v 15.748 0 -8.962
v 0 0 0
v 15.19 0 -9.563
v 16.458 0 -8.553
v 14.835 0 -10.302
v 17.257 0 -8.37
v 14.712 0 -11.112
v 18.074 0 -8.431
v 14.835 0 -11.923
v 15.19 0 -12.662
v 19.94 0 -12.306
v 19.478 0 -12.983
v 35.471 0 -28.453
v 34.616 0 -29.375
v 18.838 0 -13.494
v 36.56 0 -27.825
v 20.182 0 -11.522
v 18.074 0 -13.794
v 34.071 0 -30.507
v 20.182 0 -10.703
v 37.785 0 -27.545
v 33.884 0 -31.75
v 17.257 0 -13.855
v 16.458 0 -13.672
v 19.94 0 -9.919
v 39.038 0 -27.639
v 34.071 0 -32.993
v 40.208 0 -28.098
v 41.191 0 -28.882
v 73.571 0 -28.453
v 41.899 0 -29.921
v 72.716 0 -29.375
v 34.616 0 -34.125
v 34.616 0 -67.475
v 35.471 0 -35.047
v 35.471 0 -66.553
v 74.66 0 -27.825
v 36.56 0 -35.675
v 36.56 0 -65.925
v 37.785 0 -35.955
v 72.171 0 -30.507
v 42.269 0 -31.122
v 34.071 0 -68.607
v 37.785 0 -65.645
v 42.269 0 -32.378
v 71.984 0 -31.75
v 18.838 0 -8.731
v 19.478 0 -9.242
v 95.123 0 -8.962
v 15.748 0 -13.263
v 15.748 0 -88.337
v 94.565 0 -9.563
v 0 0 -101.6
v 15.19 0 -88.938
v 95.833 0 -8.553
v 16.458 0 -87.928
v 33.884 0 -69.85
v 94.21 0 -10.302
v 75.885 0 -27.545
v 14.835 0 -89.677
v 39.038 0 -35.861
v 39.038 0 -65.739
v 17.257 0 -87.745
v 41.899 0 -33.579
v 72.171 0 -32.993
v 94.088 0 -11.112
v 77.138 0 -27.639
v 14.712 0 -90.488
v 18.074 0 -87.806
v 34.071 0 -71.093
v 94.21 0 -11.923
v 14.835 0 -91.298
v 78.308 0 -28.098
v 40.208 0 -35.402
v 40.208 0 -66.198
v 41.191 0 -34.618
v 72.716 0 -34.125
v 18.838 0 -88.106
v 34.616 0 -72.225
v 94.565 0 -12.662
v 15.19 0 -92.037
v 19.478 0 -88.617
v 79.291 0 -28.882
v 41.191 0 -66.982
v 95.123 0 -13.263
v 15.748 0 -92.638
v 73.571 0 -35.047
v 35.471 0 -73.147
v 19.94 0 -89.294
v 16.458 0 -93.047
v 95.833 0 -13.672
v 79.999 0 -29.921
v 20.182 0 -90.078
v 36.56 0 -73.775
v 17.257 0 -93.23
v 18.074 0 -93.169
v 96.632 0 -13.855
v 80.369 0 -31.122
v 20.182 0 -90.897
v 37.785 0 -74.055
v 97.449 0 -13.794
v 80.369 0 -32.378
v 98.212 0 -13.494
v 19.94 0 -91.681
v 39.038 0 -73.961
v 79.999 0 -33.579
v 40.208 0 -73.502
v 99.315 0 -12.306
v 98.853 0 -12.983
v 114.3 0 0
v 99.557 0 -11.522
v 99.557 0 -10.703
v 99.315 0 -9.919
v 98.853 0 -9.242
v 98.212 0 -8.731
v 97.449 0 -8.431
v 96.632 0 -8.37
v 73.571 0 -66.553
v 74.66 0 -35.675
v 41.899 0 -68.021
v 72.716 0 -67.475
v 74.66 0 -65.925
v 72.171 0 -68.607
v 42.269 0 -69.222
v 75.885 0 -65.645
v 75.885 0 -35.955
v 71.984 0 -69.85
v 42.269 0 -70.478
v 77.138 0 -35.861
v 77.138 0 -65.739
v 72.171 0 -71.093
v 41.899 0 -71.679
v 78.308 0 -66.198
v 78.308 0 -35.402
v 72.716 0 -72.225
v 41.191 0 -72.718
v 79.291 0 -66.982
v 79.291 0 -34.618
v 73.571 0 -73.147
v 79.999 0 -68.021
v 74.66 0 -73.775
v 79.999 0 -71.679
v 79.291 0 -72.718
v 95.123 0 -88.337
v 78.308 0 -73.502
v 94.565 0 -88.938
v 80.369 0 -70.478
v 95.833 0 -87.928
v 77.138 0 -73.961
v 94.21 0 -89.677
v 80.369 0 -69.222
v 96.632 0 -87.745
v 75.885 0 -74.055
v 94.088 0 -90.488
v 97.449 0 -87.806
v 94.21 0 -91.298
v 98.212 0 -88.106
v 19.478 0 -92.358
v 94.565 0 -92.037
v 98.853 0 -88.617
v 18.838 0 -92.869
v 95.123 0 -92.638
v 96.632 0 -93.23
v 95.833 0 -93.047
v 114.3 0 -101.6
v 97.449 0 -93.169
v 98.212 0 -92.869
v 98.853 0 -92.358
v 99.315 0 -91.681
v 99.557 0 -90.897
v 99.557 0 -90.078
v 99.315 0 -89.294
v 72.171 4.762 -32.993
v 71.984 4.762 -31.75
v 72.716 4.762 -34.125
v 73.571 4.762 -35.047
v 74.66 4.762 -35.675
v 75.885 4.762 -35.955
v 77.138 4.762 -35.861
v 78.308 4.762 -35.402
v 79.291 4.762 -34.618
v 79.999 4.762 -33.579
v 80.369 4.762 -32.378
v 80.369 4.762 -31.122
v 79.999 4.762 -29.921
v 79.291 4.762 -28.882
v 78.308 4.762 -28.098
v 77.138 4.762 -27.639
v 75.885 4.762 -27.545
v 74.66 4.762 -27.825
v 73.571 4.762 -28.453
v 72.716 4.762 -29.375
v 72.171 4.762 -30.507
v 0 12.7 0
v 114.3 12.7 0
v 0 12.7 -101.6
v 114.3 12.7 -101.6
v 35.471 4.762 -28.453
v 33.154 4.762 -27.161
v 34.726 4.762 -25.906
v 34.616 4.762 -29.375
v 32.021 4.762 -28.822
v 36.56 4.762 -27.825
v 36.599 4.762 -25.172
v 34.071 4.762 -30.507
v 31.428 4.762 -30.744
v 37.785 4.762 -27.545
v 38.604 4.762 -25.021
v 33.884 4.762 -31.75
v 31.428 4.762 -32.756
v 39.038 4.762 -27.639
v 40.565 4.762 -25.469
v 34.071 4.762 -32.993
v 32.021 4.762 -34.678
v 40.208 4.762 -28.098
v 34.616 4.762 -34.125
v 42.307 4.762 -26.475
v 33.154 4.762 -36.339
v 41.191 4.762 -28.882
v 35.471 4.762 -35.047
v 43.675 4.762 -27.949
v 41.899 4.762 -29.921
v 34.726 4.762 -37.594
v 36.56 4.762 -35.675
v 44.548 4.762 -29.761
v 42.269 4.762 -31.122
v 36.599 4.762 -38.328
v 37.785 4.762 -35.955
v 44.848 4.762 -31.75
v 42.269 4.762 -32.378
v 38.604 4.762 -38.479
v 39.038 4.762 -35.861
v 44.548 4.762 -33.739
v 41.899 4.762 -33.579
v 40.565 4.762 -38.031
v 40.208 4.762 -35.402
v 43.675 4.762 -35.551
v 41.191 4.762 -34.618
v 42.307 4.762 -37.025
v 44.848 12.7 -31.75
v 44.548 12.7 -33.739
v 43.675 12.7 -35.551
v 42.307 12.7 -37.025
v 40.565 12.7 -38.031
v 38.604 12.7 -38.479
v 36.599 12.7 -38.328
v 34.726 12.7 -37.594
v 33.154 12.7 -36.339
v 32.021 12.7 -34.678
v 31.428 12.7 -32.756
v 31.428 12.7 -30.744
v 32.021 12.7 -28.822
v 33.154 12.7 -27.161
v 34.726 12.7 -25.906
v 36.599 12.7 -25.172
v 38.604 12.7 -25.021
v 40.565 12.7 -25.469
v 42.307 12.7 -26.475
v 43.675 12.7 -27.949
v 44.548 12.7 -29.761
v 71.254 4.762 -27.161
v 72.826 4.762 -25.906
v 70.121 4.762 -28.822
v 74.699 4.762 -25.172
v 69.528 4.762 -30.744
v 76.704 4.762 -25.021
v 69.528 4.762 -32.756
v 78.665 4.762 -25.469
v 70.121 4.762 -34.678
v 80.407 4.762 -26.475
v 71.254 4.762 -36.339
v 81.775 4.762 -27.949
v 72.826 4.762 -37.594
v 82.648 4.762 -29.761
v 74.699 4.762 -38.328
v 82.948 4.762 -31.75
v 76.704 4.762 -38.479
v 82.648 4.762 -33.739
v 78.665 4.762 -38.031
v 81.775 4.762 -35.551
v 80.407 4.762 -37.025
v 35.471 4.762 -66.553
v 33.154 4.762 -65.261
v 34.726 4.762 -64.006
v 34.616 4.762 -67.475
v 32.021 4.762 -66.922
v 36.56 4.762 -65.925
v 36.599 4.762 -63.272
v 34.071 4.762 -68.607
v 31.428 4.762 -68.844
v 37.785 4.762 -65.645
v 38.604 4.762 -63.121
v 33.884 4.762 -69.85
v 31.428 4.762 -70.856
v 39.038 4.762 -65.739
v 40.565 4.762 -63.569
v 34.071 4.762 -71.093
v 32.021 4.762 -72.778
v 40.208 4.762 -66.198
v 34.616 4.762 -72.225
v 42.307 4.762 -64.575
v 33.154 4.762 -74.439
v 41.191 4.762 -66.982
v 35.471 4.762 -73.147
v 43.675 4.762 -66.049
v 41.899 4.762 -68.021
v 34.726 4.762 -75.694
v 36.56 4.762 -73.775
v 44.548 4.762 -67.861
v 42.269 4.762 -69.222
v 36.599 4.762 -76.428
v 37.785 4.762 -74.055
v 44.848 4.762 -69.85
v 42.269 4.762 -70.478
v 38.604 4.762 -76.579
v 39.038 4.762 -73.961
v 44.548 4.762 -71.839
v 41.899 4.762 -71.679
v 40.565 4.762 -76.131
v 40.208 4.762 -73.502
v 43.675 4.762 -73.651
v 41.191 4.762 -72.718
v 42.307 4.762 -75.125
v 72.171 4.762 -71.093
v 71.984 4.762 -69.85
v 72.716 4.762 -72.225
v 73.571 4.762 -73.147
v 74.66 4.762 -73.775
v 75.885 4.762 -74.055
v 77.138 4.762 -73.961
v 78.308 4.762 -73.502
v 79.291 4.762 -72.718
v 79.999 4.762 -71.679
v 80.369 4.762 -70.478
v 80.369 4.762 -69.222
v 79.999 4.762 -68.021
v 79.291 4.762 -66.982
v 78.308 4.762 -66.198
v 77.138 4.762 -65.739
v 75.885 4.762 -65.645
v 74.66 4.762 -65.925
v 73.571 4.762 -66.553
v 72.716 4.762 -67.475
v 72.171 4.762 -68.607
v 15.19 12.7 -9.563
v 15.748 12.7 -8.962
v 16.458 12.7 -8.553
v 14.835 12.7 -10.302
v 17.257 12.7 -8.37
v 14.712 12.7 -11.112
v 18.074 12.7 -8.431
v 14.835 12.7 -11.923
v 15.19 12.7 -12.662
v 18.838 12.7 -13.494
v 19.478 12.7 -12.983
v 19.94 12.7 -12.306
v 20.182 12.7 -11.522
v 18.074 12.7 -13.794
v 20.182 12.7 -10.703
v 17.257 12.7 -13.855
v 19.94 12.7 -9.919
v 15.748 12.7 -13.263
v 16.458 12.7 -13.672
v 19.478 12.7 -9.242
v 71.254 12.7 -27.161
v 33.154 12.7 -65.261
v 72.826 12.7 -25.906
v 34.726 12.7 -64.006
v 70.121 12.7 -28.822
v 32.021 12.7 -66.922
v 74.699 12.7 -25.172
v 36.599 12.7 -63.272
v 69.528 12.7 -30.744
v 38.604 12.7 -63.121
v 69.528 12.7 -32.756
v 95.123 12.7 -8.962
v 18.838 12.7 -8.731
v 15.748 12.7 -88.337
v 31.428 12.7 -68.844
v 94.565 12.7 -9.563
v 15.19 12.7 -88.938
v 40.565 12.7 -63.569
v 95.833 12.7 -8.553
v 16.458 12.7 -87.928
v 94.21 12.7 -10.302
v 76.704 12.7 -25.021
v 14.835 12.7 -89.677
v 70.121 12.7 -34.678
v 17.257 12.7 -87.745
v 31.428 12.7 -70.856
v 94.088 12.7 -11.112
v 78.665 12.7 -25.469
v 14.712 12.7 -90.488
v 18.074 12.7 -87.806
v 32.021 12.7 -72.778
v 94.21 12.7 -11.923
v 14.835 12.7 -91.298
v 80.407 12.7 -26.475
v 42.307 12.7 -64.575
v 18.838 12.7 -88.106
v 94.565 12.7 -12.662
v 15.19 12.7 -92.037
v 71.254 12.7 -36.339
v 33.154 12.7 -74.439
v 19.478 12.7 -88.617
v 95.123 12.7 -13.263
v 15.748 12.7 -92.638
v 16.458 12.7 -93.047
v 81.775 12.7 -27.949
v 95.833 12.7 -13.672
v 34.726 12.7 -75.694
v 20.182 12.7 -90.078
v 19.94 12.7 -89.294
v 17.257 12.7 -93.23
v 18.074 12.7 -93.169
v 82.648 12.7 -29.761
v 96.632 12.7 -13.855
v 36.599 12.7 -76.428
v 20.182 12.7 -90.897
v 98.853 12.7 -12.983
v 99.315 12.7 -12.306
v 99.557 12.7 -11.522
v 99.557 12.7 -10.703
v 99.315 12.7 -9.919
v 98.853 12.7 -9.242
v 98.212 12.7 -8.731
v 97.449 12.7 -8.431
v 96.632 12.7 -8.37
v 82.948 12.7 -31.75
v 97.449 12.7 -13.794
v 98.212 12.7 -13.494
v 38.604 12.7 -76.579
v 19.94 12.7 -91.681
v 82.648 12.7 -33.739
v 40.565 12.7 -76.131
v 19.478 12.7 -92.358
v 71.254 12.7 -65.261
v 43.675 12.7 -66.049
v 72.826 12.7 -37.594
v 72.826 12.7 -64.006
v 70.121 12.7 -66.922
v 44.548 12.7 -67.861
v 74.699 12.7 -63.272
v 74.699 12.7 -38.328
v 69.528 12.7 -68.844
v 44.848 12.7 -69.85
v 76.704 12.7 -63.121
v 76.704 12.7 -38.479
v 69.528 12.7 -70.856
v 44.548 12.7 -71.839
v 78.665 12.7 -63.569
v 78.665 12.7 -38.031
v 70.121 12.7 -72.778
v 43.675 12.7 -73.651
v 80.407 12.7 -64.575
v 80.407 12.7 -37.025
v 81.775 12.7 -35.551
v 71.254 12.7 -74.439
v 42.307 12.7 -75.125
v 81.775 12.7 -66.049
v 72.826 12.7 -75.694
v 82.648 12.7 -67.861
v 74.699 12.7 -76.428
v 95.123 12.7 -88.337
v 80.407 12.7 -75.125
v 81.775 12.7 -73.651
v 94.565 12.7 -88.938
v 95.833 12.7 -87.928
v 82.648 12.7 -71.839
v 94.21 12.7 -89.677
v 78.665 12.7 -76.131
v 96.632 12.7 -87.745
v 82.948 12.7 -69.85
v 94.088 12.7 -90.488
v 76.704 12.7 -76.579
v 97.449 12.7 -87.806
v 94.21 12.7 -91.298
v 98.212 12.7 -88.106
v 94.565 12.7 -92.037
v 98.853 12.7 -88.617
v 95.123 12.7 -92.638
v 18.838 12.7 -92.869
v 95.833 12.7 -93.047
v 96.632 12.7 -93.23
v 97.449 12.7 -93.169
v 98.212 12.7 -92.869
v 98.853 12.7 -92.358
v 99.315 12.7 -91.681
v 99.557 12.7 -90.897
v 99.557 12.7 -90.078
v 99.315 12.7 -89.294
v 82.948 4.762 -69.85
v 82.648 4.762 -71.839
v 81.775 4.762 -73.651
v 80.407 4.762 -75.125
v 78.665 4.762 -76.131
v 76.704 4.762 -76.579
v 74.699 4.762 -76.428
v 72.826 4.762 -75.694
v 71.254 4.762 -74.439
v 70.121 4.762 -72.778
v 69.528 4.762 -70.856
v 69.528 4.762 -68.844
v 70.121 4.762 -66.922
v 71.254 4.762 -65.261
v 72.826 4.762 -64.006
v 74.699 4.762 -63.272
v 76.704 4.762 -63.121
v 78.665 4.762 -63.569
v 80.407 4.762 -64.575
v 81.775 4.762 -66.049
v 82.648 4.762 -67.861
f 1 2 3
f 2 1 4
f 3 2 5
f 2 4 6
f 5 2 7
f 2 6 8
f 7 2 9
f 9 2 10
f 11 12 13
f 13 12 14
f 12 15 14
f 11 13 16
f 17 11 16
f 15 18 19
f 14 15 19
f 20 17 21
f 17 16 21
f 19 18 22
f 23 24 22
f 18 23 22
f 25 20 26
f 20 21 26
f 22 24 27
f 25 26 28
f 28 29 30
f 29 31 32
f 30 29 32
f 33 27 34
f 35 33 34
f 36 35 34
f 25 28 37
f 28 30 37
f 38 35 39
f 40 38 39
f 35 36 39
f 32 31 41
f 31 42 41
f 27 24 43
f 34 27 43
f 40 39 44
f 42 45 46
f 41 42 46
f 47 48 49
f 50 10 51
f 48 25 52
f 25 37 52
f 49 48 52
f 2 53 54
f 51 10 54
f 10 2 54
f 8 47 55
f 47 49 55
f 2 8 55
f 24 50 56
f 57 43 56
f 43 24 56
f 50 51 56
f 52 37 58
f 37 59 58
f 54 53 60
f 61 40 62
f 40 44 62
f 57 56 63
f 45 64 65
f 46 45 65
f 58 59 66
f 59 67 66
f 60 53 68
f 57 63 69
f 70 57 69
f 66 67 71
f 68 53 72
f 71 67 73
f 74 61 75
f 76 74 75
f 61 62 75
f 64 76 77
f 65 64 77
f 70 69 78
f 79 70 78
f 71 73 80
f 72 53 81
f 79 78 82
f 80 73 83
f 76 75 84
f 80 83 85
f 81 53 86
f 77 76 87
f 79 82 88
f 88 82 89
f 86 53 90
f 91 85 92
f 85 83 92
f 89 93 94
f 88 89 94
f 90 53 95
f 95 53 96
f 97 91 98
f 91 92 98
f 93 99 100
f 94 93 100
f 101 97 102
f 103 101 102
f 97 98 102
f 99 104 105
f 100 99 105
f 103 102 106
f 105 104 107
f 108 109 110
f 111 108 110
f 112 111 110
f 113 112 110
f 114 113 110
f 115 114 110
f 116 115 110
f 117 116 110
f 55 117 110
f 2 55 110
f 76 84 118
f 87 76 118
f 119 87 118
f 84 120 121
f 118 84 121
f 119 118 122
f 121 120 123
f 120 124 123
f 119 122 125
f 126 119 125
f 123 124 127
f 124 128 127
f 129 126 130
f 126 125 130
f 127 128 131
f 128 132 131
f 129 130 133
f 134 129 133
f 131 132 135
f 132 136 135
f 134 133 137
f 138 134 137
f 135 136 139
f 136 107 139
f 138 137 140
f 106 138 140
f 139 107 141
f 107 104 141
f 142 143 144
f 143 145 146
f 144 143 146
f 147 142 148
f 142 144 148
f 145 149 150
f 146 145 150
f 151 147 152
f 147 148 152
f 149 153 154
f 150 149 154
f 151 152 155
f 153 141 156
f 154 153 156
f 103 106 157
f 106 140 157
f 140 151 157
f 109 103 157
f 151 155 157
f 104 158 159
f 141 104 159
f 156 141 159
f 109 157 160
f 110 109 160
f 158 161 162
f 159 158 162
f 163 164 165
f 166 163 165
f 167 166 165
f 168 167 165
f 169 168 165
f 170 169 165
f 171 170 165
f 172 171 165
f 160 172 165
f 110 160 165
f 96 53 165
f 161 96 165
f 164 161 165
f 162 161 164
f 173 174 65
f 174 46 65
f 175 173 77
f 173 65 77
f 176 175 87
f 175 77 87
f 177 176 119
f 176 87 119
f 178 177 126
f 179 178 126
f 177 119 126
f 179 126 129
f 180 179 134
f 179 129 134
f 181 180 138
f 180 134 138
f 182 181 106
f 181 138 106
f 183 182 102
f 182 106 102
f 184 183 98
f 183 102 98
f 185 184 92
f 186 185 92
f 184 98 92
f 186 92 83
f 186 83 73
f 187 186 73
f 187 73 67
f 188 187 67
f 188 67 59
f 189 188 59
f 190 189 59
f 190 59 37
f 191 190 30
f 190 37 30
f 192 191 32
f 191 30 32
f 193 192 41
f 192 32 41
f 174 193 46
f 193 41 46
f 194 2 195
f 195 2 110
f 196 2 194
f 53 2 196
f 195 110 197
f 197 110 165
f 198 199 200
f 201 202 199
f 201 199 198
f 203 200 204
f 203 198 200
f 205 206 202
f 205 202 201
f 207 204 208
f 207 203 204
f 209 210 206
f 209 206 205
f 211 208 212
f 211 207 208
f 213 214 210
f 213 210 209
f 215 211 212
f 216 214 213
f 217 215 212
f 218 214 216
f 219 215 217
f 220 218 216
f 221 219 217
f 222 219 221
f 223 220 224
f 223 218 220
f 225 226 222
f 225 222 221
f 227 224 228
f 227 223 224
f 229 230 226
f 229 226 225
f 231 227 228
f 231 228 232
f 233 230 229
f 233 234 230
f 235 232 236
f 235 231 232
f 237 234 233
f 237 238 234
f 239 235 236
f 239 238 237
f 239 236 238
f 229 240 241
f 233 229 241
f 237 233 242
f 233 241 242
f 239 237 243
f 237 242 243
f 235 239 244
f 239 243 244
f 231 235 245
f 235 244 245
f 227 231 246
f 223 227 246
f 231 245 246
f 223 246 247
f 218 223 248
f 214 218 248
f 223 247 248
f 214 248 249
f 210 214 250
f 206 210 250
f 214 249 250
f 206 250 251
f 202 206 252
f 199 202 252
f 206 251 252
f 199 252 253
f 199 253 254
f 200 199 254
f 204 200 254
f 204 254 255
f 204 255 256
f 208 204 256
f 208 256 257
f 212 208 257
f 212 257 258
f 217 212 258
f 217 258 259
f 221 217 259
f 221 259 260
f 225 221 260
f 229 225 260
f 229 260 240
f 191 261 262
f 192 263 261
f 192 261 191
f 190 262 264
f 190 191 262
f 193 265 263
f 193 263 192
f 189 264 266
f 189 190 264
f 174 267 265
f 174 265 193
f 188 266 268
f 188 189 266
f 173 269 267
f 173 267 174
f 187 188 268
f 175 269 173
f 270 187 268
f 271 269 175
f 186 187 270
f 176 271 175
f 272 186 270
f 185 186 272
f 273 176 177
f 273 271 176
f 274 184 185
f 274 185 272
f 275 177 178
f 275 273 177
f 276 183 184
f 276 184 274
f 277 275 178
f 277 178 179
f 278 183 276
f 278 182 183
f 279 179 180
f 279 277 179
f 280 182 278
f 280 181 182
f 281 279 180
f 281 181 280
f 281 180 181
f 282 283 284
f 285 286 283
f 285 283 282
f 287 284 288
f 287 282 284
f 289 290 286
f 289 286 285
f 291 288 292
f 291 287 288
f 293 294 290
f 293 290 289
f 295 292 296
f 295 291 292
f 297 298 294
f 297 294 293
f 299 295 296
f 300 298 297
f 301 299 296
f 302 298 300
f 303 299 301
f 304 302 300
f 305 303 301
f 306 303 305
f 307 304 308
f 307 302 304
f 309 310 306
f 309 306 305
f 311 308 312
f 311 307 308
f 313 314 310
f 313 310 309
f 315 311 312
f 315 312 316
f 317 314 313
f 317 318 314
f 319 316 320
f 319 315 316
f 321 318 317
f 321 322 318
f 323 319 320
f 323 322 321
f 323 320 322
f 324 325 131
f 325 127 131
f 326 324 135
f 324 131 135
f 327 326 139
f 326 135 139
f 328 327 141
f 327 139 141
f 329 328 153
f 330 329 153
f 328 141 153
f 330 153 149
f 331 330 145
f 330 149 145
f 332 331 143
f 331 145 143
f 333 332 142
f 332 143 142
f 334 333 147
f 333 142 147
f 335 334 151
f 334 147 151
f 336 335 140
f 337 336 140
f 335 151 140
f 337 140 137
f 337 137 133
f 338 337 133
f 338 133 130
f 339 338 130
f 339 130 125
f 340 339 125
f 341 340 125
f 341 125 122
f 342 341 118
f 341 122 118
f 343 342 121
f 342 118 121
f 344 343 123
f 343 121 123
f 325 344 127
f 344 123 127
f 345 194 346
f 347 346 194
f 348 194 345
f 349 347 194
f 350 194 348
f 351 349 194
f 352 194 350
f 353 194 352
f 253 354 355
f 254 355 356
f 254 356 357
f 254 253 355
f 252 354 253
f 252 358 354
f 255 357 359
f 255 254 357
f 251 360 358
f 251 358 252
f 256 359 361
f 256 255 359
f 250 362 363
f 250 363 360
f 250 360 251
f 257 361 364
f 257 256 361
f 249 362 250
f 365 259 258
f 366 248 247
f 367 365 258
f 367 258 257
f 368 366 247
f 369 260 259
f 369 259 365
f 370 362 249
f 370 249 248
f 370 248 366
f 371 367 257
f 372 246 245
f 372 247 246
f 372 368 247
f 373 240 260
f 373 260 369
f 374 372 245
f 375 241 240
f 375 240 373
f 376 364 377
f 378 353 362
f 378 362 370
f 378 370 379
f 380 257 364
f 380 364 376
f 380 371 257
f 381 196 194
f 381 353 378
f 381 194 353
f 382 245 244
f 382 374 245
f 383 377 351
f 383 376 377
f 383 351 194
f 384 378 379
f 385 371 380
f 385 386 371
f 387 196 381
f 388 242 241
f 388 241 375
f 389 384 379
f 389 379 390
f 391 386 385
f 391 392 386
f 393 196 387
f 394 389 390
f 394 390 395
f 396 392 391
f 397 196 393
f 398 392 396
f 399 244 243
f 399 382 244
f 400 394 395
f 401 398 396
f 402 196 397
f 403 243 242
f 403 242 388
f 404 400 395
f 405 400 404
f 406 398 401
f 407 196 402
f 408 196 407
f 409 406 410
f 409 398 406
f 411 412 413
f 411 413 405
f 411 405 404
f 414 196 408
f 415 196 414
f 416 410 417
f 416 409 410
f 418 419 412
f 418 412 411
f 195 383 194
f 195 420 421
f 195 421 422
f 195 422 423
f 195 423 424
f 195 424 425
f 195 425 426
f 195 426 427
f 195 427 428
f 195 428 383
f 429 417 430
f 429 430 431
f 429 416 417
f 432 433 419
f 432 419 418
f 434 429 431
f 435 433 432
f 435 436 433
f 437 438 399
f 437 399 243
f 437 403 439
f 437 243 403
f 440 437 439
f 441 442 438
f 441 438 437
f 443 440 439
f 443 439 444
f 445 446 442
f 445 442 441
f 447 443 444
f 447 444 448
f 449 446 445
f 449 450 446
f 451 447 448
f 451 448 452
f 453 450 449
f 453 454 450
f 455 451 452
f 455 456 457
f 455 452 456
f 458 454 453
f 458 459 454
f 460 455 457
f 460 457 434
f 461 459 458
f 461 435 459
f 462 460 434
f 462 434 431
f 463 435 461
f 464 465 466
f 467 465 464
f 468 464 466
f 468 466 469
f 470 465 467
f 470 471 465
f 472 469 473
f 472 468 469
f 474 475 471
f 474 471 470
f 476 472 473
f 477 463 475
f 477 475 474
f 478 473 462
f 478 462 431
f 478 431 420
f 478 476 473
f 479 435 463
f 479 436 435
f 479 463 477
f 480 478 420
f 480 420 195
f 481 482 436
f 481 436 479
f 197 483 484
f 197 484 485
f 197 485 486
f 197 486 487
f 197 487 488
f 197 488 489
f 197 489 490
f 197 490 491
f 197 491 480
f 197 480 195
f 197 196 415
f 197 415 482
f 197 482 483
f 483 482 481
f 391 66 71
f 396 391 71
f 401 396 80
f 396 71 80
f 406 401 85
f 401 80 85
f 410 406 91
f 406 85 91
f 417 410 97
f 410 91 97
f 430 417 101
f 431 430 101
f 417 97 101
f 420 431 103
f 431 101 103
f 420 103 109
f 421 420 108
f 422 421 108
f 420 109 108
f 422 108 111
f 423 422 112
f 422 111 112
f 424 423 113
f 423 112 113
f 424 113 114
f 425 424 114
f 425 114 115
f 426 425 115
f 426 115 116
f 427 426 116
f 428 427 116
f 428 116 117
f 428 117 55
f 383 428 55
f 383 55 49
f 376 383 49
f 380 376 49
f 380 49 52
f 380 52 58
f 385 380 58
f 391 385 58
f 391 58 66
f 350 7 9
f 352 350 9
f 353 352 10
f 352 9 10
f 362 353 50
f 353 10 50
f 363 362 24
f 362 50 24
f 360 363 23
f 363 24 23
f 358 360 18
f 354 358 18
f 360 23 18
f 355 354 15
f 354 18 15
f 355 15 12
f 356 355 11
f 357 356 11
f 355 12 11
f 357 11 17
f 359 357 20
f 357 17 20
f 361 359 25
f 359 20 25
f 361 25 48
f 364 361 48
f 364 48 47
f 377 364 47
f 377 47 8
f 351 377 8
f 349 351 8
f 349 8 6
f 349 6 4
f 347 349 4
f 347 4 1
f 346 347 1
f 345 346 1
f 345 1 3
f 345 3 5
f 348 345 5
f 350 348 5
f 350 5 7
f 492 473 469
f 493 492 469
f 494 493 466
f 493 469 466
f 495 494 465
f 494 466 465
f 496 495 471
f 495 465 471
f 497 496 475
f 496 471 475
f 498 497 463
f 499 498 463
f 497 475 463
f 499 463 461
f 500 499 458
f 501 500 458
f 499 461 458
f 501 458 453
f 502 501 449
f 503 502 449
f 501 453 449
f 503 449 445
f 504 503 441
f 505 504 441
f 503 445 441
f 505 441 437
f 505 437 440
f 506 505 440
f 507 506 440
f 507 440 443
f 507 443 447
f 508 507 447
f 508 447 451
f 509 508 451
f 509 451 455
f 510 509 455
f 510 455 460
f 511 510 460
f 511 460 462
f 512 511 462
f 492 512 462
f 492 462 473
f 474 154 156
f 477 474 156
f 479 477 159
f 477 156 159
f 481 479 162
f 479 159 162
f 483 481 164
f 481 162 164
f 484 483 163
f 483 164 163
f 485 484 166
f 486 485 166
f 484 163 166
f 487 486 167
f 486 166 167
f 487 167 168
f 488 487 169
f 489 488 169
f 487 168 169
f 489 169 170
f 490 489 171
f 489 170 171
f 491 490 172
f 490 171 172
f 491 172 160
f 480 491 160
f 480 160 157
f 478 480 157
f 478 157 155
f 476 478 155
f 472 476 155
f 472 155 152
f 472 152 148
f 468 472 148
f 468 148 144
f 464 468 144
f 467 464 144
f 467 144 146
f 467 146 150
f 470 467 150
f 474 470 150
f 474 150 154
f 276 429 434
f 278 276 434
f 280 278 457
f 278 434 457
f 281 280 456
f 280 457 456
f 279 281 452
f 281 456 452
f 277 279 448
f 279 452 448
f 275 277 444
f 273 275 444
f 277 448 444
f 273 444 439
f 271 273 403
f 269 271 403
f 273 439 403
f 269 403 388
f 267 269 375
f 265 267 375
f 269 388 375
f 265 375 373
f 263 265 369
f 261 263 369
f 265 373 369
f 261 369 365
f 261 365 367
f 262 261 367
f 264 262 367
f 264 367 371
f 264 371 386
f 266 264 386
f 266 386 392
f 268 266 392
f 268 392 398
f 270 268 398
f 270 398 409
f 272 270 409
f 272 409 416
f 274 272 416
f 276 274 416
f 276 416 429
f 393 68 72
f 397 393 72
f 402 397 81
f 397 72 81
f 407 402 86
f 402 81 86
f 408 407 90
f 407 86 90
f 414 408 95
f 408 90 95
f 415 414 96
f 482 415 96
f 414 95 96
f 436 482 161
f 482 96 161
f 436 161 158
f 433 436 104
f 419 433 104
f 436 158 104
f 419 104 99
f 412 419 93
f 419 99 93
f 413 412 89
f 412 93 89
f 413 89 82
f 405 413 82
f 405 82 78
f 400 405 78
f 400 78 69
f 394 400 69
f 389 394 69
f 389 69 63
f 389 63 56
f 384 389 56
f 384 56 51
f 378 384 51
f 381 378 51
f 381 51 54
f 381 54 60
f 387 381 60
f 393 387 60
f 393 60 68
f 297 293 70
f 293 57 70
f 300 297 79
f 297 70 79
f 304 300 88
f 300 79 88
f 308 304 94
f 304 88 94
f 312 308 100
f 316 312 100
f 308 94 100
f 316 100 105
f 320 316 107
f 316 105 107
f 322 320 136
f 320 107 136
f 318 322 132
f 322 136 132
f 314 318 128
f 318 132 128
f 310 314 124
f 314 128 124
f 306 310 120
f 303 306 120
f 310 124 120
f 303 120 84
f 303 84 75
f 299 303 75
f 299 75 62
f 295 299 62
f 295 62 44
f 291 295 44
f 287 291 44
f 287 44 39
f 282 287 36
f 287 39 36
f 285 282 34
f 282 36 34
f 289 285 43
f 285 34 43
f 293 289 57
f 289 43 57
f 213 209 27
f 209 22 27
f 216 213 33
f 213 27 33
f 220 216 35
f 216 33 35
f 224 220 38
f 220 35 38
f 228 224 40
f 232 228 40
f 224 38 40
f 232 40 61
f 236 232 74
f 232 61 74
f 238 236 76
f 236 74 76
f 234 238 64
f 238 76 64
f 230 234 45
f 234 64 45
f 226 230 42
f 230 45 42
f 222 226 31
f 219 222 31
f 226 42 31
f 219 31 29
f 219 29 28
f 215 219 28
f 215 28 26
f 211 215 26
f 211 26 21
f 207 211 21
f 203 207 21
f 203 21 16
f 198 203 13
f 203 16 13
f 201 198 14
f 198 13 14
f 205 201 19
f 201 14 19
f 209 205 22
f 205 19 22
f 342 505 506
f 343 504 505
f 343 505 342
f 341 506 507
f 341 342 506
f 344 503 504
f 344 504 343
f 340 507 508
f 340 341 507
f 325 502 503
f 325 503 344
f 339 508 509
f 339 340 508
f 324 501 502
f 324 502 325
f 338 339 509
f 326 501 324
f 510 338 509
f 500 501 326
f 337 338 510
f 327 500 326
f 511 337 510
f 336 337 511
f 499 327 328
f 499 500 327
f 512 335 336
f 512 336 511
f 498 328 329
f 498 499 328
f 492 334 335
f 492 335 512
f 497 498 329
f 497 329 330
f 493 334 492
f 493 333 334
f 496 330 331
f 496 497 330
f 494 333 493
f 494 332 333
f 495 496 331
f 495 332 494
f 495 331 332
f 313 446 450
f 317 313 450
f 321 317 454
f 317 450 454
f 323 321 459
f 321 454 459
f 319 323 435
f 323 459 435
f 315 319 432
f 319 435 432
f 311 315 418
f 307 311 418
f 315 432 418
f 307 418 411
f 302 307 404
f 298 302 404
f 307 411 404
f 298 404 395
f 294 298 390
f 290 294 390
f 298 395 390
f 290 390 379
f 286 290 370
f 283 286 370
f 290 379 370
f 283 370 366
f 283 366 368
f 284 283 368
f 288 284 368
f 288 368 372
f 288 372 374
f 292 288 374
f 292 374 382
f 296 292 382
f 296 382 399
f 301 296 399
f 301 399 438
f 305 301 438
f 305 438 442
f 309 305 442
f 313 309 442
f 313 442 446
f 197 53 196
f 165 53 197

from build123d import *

# Parameters (mm, degrees)
SKETCH1_W                                         = 114.3
SKETCH1_H                                         = 101.6
BOSS_EXTRUDE1_DEPTH                               = 12.7
CBORE_FOR_5_16_SOCKET_HEAD_CAP_SCREW1_D           = 8.4328
CBORE_FOR_5_16_SOCKET_HEAD_CAP_SCREW1_CBORE_D     = 13.49502
CBORE_FOR_5_16_SOCKET_HEAD_CAP_SCREW1_CBORE_DEPTH = 7.9375
M5_CLEARANCE_HOLE1_D                              = 5.5


with BuildPart() as part:
    # Sketch1 → Boss-Extrude1 (new body)
    with BuildSketch(Plane(origin=(0, 0, 0), x_dir=(1, 0, 0), z_dir=(0, 1, 0))):
        with Locations((57.15, 50.8)):
            Rectangle(SKETCH1_W, SKETCH1_H)
    extrude(amount=BOSS_EXTRUDE1_DEPTH)

    # CBORE for 5/16 Socket Head Cap Screw1 (through all)
    with Locations(Plane(origin=(0, 12.7, 0), x_dir=(1, 0, 0), z_dir=(0, 1, 0))):
        with Locations((38.1, 69.85), (76.2, 69.85), (76.2, 31.75), (38.1, 31.75)):
            CounterBoreHole(CBORE_FOR_5_16_SOCKET_HEAD_CAP_SCREW1_D / 2, CBORE_FOR_5_16_SOCKET_HEAD_CAP_SCREW1_CBORE_D / 2, CBORE_FOR_5_16_SOCKET_HEAD_CAP_SCREW1_CBORE_DEPTH)

    # M5 Clearance Hole1 (through all)
    with Locations(Plane(origin=(0, 12.7, 0), x_dir=(1, 0, 0), z_dir=(0, 1, 0))):
        with Locations((17.4625, 11.1125), (96.8375, 11.1125), (96.8375, 90.4875), (17.4625, 90.4875)):
            Hole(M5_CLEARANCE_HOLE1_D / 2)


solid = part.part
